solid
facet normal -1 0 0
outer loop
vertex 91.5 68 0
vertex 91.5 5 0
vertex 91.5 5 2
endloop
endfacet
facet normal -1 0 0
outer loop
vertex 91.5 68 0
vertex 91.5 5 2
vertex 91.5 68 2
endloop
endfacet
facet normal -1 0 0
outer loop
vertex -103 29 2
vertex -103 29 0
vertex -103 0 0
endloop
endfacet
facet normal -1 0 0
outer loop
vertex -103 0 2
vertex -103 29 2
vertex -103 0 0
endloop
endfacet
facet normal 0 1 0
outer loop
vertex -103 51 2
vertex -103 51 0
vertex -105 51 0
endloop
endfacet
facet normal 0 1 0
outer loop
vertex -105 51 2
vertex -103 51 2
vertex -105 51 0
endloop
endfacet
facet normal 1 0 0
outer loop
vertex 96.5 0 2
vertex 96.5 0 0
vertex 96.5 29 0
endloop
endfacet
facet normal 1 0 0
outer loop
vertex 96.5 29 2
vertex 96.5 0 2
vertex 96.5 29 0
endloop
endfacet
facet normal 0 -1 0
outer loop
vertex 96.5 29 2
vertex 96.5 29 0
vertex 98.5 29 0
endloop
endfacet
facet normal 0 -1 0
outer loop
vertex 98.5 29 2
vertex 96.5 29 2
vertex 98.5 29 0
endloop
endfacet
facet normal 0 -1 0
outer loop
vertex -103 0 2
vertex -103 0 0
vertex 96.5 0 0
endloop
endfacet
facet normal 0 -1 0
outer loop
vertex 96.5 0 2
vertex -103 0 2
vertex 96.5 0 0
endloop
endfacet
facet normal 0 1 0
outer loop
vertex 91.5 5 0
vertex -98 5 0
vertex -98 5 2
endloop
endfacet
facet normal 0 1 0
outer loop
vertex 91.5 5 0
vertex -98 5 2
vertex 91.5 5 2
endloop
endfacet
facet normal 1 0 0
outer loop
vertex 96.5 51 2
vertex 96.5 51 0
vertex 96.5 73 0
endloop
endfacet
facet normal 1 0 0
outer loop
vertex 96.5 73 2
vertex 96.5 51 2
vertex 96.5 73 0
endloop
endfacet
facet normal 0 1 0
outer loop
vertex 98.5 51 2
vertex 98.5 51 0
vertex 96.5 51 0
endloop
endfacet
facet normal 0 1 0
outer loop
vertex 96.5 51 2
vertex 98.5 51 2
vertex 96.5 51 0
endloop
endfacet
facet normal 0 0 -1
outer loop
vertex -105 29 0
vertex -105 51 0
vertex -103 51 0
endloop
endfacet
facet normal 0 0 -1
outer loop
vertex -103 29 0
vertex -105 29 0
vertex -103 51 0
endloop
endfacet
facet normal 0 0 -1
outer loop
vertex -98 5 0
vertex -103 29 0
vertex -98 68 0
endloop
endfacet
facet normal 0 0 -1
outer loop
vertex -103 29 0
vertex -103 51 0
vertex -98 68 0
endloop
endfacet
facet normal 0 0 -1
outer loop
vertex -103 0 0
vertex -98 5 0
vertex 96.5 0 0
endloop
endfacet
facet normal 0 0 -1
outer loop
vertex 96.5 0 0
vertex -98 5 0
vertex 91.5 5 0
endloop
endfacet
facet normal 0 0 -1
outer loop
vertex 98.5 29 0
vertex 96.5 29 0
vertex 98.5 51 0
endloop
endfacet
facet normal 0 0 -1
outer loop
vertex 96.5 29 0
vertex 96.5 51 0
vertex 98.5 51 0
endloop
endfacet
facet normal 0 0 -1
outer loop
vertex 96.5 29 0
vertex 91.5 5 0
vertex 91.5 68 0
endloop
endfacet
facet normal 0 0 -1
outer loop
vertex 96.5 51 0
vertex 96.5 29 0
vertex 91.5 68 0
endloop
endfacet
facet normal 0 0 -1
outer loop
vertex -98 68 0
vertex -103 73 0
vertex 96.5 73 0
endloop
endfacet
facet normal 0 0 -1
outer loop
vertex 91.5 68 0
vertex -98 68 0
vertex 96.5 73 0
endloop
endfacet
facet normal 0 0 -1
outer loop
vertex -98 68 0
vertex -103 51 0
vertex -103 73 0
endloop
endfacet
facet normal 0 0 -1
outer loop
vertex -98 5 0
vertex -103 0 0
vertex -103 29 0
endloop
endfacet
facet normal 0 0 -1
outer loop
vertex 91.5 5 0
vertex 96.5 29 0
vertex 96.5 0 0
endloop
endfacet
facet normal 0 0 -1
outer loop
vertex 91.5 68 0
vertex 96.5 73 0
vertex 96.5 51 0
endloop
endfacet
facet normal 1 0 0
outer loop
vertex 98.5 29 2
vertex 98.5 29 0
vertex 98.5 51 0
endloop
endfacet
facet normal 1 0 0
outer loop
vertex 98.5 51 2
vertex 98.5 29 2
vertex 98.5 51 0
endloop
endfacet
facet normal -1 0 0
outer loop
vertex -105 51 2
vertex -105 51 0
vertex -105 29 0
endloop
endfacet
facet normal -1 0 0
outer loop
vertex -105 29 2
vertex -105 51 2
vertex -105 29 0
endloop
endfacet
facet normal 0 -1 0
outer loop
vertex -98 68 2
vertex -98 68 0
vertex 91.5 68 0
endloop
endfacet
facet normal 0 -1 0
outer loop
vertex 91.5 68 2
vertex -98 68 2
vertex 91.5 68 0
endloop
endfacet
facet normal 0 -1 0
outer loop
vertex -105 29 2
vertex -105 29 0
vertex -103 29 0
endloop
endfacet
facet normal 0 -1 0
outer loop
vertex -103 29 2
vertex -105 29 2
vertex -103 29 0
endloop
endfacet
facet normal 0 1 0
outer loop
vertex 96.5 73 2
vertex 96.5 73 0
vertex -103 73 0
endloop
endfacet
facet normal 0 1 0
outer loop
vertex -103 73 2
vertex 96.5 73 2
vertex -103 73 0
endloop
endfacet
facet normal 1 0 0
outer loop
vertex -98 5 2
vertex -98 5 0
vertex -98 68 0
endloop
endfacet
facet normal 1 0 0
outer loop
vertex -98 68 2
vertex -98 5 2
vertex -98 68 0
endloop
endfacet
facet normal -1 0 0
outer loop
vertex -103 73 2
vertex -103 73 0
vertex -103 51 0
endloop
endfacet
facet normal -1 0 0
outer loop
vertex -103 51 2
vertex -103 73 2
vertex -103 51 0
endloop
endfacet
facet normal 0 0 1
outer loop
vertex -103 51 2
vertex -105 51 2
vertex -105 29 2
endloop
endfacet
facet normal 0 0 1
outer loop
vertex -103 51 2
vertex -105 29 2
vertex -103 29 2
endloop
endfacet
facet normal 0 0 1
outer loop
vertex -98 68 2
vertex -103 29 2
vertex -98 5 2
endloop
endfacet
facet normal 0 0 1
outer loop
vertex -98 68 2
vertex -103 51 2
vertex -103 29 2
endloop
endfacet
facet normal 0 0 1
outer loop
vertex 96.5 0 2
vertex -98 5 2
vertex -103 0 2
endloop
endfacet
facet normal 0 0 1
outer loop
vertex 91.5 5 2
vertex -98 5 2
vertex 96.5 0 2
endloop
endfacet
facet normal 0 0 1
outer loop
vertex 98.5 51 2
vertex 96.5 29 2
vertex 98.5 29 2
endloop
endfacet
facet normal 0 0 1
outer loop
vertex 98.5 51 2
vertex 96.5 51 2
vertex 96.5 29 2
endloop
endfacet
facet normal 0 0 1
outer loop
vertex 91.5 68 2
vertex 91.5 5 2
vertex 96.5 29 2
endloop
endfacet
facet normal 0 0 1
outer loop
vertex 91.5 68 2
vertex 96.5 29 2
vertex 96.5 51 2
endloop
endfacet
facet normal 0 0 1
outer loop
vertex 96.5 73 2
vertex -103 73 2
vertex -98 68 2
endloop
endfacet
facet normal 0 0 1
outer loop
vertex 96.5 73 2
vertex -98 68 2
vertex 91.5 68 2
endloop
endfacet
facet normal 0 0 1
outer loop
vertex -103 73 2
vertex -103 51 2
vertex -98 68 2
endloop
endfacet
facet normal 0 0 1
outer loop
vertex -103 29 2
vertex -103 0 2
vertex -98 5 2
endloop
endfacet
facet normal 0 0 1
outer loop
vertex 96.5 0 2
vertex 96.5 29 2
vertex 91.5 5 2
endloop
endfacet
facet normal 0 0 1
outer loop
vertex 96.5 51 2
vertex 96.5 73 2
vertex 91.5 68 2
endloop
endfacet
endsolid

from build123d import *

# Parameters (mm, degrees)
F0_W     = 189.5
F0_H     = 63
F1_DEPTH = 2


with BuildPart() as f1:
    # F0 (on Top) → F1 (new body)
    with BuildSketch(Plane.XY):
        Polygon((96.5, 73), (-103, 73), (-103, 51), (-105, 51), (-105, 29), (-103, 29), (-103, 0), (96.5, 0), (96.5, 29), (98.5, 29), (98.5, 51), (96.5, 51), align=None)
        with Locations((-3.25, 36.5)):
            Rectangle(F0_W, F0_H, mode=Mode.SUBTRACT)
    extrude(amount=F1_DEPTH)


solid = f1.part
